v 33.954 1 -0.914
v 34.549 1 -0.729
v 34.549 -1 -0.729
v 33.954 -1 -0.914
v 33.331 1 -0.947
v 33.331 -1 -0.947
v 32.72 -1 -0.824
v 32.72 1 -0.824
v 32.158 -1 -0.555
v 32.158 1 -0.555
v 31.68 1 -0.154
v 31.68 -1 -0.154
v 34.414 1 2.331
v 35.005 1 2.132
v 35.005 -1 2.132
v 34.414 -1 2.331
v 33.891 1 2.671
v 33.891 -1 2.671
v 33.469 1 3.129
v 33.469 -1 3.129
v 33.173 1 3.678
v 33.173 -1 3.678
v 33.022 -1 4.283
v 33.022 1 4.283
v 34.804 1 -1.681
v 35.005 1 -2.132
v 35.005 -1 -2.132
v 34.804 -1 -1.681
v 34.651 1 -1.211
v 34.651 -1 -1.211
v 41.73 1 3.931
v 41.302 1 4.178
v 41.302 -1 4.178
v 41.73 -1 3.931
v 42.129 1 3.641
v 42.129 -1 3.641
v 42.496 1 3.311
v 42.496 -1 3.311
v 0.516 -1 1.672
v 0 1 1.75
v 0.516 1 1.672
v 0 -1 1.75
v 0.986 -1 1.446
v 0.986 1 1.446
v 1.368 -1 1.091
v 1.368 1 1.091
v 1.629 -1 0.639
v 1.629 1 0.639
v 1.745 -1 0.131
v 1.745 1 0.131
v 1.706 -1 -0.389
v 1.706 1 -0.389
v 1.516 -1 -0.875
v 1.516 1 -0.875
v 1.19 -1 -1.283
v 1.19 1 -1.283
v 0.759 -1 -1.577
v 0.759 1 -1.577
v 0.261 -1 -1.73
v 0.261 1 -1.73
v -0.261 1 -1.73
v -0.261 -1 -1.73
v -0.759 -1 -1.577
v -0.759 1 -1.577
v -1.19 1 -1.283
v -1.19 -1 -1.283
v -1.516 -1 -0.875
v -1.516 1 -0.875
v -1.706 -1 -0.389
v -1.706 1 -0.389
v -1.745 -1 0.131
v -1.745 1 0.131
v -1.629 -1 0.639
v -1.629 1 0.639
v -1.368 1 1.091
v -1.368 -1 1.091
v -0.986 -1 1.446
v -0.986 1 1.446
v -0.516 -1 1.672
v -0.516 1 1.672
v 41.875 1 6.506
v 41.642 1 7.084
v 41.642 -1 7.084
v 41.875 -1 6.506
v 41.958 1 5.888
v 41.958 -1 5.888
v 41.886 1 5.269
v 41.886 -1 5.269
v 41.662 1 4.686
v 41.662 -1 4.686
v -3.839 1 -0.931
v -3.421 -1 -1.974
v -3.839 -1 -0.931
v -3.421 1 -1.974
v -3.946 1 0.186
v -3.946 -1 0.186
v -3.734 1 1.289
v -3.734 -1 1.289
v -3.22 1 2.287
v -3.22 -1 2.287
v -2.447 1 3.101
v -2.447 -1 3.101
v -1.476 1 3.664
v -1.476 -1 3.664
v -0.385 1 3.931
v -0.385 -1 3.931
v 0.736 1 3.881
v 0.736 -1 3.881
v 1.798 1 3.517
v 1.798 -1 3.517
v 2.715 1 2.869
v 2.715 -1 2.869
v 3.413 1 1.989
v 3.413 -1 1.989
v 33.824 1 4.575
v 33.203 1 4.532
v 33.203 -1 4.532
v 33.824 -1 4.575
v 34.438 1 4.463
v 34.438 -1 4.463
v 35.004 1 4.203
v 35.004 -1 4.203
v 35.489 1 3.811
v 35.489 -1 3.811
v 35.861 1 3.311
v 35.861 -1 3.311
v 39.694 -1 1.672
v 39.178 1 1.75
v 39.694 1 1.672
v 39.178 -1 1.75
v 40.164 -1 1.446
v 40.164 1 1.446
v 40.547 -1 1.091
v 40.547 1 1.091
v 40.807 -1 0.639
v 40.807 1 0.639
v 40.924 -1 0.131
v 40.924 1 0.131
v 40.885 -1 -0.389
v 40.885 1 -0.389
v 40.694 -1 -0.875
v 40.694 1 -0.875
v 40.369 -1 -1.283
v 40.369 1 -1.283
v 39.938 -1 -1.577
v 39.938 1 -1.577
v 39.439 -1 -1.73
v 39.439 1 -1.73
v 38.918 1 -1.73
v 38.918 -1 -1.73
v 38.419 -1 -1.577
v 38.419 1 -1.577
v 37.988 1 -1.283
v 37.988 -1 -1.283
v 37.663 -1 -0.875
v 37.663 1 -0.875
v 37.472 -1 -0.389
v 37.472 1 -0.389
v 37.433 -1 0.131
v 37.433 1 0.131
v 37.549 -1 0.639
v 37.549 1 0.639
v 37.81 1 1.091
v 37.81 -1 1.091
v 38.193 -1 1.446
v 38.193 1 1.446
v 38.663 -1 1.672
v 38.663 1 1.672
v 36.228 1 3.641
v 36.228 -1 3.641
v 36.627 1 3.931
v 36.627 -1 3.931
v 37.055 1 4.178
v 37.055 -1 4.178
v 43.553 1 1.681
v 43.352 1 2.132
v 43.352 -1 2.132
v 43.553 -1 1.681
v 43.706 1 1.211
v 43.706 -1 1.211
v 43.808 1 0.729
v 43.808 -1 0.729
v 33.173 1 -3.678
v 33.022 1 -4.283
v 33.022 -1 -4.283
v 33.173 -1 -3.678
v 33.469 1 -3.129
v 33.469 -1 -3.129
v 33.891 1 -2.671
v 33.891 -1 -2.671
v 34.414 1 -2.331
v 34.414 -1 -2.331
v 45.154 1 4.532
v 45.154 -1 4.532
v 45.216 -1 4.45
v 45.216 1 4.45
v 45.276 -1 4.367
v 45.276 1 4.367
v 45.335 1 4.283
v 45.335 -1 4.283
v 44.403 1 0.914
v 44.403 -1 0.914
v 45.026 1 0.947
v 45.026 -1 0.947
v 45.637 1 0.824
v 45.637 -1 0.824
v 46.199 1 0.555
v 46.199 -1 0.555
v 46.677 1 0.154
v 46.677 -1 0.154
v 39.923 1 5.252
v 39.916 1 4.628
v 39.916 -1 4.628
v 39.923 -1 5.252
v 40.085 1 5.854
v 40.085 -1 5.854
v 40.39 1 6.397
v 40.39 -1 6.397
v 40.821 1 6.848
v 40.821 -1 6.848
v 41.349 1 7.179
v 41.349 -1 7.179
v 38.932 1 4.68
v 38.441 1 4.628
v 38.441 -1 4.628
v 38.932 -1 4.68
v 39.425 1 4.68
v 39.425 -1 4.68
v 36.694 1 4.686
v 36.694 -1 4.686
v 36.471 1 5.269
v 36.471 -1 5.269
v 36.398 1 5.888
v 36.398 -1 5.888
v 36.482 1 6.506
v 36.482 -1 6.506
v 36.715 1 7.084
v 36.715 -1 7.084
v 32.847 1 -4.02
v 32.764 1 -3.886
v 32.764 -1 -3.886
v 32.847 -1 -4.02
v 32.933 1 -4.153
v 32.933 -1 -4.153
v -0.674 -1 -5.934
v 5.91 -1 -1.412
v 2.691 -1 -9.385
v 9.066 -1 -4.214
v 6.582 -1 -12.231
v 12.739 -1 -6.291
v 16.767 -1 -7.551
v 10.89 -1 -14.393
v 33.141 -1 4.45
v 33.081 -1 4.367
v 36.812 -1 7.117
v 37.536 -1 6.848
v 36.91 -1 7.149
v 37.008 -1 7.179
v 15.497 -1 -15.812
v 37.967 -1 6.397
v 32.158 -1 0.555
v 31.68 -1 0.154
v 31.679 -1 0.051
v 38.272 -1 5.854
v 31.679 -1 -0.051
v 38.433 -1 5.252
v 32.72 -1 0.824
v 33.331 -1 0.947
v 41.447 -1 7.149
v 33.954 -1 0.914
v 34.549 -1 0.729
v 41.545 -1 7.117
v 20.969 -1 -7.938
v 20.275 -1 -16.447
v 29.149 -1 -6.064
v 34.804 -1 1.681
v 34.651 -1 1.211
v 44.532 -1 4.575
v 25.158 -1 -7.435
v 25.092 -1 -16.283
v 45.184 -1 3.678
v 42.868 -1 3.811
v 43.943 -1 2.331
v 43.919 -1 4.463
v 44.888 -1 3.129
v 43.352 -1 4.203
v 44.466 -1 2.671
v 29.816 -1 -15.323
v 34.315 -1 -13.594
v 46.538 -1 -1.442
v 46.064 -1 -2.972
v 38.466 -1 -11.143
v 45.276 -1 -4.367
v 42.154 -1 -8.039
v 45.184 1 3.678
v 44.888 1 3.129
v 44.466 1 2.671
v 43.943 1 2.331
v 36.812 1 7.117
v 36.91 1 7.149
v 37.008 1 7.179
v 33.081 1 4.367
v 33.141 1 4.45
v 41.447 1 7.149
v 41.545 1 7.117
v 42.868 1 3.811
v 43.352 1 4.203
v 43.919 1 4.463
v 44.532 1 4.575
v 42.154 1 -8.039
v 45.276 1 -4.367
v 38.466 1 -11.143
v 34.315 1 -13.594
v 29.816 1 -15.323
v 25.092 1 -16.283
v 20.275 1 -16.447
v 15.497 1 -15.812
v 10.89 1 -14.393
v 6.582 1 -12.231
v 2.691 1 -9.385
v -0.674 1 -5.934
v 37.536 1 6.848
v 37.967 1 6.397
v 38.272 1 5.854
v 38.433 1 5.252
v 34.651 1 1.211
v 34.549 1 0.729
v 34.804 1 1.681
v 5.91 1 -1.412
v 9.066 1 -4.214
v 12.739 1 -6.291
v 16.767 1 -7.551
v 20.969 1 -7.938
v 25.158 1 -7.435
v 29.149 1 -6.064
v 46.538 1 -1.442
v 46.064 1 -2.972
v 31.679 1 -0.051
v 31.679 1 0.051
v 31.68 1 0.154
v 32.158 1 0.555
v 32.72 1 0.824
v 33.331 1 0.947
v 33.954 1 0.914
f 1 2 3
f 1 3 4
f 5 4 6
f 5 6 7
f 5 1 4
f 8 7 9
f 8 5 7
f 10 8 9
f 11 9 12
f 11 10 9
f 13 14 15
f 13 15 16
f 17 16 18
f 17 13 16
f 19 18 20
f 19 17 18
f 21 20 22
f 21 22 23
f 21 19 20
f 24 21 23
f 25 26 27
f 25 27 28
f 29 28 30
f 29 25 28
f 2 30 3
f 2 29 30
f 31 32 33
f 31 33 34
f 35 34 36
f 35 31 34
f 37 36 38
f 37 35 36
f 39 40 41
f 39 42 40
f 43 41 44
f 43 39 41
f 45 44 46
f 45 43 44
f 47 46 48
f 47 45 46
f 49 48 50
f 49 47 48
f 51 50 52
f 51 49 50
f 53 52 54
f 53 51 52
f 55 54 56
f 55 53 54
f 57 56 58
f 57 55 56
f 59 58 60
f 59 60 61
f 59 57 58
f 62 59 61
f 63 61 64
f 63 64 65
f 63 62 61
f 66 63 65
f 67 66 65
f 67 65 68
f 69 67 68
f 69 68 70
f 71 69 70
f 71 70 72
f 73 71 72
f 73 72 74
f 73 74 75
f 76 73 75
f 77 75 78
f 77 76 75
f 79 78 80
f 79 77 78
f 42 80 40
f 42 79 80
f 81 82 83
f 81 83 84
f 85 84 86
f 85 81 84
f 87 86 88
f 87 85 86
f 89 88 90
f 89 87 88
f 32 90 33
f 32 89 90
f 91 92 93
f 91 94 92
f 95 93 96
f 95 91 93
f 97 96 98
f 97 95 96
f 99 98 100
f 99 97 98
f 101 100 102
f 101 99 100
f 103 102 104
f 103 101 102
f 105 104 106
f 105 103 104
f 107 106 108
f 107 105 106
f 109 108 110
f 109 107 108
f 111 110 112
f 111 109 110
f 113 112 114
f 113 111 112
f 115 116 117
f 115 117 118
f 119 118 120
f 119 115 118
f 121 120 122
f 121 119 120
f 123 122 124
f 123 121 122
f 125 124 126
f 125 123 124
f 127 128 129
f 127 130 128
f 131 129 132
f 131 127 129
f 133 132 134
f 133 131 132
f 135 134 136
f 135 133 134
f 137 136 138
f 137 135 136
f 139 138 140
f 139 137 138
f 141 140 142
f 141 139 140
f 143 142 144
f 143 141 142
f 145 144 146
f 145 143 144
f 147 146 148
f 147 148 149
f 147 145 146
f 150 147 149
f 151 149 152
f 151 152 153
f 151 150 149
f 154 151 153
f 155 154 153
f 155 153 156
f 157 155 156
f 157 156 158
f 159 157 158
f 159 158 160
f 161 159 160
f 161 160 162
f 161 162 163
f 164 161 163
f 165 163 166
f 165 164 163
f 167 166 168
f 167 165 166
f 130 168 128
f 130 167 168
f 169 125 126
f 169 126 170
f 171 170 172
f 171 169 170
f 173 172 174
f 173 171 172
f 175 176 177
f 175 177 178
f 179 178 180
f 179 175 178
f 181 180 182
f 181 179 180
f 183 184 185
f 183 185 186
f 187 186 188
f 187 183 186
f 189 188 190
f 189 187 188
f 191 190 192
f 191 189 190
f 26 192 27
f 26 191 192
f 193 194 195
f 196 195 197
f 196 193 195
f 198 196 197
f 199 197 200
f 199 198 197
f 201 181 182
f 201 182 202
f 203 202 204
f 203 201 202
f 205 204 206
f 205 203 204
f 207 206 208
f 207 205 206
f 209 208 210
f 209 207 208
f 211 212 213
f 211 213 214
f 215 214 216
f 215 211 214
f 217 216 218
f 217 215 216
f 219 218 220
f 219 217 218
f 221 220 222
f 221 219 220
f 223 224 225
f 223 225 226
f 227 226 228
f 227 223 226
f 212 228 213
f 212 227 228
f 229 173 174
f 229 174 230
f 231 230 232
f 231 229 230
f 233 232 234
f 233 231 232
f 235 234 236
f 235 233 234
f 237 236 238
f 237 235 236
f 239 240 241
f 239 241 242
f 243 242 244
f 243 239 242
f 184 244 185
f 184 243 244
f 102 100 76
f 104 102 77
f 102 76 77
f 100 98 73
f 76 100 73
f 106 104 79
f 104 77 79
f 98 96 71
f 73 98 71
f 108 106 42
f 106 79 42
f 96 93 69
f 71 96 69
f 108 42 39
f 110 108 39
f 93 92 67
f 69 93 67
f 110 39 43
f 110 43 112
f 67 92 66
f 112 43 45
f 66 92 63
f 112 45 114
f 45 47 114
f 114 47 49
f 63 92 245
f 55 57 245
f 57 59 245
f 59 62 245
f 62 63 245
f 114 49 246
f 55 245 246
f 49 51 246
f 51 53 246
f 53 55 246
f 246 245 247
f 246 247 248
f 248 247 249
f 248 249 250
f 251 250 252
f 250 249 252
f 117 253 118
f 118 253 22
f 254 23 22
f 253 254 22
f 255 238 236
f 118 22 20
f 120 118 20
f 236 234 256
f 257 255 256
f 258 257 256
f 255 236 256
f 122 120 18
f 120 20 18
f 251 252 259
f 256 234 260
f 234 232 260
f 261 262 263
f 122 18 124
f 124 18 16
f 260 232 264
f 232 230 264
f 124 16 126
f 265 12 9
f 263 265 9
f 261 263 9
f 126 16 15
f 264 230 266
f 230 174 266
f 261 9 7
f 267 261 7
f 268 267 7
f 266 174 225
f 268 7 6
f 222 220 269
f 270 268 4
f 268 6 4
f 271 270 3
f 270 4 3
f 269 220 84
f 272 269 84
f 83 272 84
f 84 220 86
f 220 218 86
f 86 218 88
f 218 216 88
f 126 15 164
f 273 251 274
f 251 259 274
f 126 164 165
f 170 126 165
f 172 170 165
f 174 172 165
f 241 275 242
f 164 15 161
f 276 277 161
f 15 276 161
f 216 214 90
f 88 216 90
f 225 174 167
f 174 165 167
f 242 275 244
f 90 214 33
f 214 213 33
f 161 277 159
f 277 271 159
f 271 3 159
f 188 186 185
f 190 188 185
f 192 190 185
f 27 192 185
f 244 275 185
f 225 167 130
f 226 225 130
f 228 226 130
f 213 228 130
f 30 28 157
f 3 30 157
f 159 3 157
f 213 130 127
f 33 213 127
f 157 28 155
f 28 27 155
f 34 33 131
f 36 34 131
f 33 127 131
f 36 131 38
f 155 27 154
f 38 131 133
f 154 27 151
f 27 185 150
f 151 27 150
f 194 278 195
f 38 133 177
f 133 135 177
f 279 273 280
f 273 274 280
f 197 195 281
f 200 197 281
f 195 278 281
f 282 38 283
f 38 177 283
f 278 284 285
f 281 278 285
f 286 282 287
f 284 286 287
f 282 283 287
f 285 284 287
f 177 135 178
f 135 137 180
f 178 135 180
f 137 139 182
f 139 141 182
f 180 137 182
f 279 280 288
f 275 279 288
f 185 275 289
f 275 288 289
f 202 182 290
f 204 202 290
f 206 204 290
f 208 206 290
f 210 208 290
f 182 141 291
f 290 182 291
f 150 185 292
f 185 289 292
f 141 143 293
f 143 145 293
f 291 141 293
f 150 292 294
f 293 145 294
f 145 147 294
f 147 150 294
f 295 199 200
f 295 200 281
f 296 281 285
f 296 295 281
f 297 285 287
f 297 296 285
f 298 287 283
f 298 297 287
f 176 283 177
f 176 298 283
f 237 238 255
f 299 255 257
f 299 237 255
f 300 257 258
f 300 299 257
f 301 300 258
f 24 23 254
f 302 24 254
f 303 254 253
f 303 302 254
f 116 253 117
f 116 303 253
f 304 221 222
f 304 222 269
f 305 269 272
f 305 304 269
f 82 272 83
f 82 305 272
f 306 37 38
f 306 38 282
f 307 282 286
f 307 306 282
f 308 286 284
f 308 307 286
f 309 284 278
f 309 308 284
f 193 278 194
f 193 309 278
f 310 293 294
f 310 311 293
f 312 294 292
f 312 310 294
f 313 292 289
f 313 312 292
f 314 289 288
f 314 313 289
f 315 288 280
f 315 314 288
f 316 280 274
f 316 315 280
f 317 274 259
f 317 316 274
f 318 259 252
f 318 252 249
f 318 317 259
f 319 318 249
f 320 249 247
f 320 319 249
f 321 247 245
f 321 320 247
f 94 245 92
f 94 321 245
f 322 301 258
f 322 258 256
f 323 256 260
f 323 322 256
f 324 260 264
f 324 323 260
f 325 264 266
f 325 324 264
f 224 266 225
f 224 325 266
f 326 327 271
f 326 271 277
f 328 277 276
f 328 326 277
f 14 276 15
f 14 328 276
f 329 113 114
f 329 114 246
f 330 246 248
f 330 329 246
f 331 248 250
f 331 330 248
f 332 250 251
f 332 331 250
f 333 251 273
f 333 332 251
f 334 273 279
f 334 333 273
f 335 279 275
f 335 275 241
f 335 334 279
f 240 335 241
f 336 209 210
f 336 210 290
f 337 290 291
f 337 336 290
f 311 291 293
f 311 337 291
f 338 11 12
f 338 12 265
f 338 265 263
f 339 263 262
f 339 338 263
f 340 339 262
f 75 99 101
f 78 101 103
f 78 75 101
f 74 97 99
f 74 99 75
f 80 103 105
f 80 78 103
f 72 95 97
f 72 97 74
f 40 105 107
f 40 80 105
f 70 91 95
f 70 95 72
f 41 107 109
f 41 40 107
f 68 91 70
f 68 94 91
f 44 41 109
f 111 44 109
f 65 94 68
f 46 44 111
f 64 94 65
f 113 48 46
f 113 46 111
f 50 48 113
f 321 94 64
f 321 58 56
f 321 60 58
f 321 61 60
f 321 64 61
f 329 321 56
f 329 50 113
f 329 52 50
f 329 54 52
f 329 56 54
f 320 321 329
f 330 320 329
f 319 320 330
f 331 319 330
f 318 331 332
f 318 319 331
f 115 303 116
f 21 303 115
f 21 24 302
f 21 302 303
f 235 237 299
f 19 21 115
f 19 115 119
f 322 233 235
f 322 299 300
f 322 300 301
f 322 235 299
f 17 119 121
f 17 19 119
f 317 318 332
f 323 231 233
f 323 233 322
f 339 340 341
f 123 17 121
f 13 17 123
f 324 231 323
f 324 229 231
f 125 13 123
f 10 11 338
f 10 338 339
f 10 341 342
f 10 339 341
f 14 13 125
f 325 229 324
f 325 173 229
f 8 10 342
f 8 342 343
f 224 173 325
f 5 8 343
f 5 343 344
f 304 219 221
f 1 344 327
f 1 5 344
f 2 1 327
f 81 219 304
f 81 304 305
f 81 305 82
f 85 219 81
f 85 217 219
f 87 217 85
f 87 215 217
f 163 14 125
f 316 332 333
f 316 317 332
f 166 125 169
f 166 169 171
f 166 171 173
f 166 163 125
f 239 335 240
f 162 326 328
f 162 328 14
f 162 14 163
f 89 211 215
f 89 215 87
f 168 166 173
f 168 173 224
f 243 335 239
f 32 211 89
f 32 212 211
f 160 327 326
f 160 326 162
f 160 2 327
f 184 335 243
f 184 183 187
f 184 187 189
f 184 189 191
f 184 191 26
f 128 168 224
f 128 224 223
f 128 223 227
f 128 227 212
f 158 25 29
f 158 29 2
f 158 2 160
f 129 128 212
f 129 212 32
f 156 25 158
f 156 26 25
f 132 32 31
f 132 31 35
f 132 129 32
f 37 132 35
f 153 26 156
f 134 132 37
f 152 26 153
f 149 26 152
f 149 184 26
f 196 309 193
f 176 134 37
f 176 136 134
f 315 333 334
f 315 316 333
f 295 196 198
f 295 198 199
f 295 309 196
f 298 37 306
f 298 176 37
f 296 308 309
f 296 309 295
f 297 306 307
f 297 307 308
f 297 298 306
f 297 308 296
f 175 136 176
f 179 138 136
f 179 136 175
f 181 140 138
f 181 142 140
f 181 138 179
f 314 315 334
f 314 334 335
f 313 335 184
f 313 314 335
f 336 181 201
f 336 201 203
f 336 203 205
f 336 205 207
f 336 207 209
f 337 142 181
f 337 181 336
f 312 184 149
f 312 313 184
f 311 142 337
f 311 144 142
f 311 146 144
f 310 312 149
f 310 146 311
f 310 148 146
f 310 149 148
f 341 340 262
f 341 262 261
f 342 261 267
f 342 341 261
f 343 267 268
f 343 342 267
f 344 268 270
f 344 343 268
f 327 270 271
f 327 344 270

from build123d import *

# Parameters (mm, degrees)
SKETCH1_R           = 1.75
BOSS_EXTRUDE1_DEPTH = 1
CUT_EXTRUDE2_DEPTH  = 50.543327243


with BuildPart() as part:
    # Sketch1 → Boss-Extrude1 (new, symmetric)
    with BuildSketch(Plane(origin=(0, 0, 0), x_dir=(1, 0, 0), z_dir=(0, 1, 0))):
        with BuildLine():
            ThreePointArc((-3.421468999, 1.973841404), (-1.981409632, -3.417091727), (3.412697713, -1.988968154))
            ThreePointArc((3.412697713, -1.988968154), (16.766614489, 7.551271729), (32.763842766, 3.886308189))
            ThreePointArc((32.763842766, 3.886308189), (39.466098288, -7.49448014), (45.276159017, 4.366622946))
            ThreePointArc((45.276159017, 4.366622946), (20.274964763, 16.447403527), (-3.421468999, 1.973841404))
        make_face()
        with Locations(Location((0, 0, 0), (0, 0, 270))):
            Circle(SKETCH1_R, mode=Mode.SUBTRACT)
        with Locations(Location((39.178405, 0, 0), (0, 0, 270))):
            Circle(SKETCH1_R, mode=Mode.SUBTRACT)
    extrude(amount=BOSS_EXTRUDE1_DEPTH, both=True)

    # Sketch8 → Cut-Extrude2 (cut, through all)
    with BuildSketch(Plane(origin=(0, 1, 0), x_dir=(1, 0, 0), z_dir=(0, 1, 0))):
        with BuildLine():
            ThreePointArc((33.021583794, 4.282937385), (33.665616835, 2.886903504), (35.004794682, 2.131726803))
            ThreePointArc((35.004794682, 2.131726803), (34.721278636, 1.448208144), (34.548885748, 0.728583383))
            ThreePointArc((34.548885748, 0.728583383), (33.021586384, 0.904781587), (31.679984582, 0.153919576))
            ThreePointArc((31.679984582, 0.153919576), (32.045481128, 2.317627458), (33.021583794, 4.282937385))
        make_face()
        with BuildLine():
            ThreePointArc((31.679984582, -0.153919576), (33.021586384, -0.904781587), (34.548885748, -0.728583383))
            ThreePointArc((34.548885748, -0.728583383), (34.721278636, -1.448208144), (35.004794682, -2.131726803))
            ThreePointArc((35.004794682, -2.131726803), (33.665616835, -2.886903504), (33.021583794, -4.282937385))
            ThreePointArc((33.021583794, -4.282937385), (32.045481128, -2.317627458), (31.679984582, -0.153919576))
        make_face()
        with BuildLine():
            ThreePointArc((33.202527108, -4.53198449), (34.729251382, -4.350870864), (35.861295817, -3.31059948))
            ThreePointArc((35.861295817, -3.31059948), (36.423749415, -3.791458144), (37.054880901, -4.177789805))
            ThreePointArc((37.054880901, -4.177789805), (36.415344992, -5.575889578), (36.714879444, -7.083857836))
            ThreePointArc((36.714879444, -7.083857836), (34.770015608, -6.067627458), (33.202527108, -4.53198449))
        make_face()
        with BuildLine():
            ThreePointArc((37.007651875, -7.178985365), (38.13634184, -6.135075351), (38.440728849, -4.628079099))
            ThreePointArc((38.440728849, -4.628079099), (39.178405, -4.6865), (39.916081151, -4.628079099))
            ThreePointArc((39.916081151, -4.628079099), (40.22046816, -6.135075351), (41.349158125, -7.178985365))
            ThreePointArc((41.349158125, -7.178985365), (39.178405, -7.5), (37.007651875, -7.178985365))
        make_face()
        with BuildLine():
            ThreePointArc((41.641930556, -7.083857836), (41.941465008, -5.575889578), (41.301929099, -4.177789805))
            ThreePointArc((41.301929099, -4.177789805), (41.933060585, -3.791458144), (42.495514183, -3.31059948))
            ThreePointArc((42.495514183, -3.31059948), (43.627558618, -4.350870864), (45.154282892, -4.53198449))
            ThreePointArc((45.154282892, -4.53198449), (43.586794392, -6.067627458), (41.641930556, -7.083857836))
        make_face()
        with BuildLine():
            ThreePointArc((45.335226206, -4.282937385), (44.691193165, -2.886903504), (43.352015318, -2.131726803))
            ThreePointArc((43.352015318, -2.131726803), (43.635531364, -1.448208144), (43.807924252, -0.728583383))
            ThreePointArc((43.807924252, -0.728583383), (45.335223616, -0.904781587), (46.676825418, -0.153919576))
            ThreePointArc((46.676825418, -0.153919576), (46.311328872, -2.317627458), (45.335226206, -4.282937385))
        make_face()
    extrude(amount=-CUT_EXTRUDE2_DEPTH, mode=Mode.SUBTRACT)


solid = part.part
